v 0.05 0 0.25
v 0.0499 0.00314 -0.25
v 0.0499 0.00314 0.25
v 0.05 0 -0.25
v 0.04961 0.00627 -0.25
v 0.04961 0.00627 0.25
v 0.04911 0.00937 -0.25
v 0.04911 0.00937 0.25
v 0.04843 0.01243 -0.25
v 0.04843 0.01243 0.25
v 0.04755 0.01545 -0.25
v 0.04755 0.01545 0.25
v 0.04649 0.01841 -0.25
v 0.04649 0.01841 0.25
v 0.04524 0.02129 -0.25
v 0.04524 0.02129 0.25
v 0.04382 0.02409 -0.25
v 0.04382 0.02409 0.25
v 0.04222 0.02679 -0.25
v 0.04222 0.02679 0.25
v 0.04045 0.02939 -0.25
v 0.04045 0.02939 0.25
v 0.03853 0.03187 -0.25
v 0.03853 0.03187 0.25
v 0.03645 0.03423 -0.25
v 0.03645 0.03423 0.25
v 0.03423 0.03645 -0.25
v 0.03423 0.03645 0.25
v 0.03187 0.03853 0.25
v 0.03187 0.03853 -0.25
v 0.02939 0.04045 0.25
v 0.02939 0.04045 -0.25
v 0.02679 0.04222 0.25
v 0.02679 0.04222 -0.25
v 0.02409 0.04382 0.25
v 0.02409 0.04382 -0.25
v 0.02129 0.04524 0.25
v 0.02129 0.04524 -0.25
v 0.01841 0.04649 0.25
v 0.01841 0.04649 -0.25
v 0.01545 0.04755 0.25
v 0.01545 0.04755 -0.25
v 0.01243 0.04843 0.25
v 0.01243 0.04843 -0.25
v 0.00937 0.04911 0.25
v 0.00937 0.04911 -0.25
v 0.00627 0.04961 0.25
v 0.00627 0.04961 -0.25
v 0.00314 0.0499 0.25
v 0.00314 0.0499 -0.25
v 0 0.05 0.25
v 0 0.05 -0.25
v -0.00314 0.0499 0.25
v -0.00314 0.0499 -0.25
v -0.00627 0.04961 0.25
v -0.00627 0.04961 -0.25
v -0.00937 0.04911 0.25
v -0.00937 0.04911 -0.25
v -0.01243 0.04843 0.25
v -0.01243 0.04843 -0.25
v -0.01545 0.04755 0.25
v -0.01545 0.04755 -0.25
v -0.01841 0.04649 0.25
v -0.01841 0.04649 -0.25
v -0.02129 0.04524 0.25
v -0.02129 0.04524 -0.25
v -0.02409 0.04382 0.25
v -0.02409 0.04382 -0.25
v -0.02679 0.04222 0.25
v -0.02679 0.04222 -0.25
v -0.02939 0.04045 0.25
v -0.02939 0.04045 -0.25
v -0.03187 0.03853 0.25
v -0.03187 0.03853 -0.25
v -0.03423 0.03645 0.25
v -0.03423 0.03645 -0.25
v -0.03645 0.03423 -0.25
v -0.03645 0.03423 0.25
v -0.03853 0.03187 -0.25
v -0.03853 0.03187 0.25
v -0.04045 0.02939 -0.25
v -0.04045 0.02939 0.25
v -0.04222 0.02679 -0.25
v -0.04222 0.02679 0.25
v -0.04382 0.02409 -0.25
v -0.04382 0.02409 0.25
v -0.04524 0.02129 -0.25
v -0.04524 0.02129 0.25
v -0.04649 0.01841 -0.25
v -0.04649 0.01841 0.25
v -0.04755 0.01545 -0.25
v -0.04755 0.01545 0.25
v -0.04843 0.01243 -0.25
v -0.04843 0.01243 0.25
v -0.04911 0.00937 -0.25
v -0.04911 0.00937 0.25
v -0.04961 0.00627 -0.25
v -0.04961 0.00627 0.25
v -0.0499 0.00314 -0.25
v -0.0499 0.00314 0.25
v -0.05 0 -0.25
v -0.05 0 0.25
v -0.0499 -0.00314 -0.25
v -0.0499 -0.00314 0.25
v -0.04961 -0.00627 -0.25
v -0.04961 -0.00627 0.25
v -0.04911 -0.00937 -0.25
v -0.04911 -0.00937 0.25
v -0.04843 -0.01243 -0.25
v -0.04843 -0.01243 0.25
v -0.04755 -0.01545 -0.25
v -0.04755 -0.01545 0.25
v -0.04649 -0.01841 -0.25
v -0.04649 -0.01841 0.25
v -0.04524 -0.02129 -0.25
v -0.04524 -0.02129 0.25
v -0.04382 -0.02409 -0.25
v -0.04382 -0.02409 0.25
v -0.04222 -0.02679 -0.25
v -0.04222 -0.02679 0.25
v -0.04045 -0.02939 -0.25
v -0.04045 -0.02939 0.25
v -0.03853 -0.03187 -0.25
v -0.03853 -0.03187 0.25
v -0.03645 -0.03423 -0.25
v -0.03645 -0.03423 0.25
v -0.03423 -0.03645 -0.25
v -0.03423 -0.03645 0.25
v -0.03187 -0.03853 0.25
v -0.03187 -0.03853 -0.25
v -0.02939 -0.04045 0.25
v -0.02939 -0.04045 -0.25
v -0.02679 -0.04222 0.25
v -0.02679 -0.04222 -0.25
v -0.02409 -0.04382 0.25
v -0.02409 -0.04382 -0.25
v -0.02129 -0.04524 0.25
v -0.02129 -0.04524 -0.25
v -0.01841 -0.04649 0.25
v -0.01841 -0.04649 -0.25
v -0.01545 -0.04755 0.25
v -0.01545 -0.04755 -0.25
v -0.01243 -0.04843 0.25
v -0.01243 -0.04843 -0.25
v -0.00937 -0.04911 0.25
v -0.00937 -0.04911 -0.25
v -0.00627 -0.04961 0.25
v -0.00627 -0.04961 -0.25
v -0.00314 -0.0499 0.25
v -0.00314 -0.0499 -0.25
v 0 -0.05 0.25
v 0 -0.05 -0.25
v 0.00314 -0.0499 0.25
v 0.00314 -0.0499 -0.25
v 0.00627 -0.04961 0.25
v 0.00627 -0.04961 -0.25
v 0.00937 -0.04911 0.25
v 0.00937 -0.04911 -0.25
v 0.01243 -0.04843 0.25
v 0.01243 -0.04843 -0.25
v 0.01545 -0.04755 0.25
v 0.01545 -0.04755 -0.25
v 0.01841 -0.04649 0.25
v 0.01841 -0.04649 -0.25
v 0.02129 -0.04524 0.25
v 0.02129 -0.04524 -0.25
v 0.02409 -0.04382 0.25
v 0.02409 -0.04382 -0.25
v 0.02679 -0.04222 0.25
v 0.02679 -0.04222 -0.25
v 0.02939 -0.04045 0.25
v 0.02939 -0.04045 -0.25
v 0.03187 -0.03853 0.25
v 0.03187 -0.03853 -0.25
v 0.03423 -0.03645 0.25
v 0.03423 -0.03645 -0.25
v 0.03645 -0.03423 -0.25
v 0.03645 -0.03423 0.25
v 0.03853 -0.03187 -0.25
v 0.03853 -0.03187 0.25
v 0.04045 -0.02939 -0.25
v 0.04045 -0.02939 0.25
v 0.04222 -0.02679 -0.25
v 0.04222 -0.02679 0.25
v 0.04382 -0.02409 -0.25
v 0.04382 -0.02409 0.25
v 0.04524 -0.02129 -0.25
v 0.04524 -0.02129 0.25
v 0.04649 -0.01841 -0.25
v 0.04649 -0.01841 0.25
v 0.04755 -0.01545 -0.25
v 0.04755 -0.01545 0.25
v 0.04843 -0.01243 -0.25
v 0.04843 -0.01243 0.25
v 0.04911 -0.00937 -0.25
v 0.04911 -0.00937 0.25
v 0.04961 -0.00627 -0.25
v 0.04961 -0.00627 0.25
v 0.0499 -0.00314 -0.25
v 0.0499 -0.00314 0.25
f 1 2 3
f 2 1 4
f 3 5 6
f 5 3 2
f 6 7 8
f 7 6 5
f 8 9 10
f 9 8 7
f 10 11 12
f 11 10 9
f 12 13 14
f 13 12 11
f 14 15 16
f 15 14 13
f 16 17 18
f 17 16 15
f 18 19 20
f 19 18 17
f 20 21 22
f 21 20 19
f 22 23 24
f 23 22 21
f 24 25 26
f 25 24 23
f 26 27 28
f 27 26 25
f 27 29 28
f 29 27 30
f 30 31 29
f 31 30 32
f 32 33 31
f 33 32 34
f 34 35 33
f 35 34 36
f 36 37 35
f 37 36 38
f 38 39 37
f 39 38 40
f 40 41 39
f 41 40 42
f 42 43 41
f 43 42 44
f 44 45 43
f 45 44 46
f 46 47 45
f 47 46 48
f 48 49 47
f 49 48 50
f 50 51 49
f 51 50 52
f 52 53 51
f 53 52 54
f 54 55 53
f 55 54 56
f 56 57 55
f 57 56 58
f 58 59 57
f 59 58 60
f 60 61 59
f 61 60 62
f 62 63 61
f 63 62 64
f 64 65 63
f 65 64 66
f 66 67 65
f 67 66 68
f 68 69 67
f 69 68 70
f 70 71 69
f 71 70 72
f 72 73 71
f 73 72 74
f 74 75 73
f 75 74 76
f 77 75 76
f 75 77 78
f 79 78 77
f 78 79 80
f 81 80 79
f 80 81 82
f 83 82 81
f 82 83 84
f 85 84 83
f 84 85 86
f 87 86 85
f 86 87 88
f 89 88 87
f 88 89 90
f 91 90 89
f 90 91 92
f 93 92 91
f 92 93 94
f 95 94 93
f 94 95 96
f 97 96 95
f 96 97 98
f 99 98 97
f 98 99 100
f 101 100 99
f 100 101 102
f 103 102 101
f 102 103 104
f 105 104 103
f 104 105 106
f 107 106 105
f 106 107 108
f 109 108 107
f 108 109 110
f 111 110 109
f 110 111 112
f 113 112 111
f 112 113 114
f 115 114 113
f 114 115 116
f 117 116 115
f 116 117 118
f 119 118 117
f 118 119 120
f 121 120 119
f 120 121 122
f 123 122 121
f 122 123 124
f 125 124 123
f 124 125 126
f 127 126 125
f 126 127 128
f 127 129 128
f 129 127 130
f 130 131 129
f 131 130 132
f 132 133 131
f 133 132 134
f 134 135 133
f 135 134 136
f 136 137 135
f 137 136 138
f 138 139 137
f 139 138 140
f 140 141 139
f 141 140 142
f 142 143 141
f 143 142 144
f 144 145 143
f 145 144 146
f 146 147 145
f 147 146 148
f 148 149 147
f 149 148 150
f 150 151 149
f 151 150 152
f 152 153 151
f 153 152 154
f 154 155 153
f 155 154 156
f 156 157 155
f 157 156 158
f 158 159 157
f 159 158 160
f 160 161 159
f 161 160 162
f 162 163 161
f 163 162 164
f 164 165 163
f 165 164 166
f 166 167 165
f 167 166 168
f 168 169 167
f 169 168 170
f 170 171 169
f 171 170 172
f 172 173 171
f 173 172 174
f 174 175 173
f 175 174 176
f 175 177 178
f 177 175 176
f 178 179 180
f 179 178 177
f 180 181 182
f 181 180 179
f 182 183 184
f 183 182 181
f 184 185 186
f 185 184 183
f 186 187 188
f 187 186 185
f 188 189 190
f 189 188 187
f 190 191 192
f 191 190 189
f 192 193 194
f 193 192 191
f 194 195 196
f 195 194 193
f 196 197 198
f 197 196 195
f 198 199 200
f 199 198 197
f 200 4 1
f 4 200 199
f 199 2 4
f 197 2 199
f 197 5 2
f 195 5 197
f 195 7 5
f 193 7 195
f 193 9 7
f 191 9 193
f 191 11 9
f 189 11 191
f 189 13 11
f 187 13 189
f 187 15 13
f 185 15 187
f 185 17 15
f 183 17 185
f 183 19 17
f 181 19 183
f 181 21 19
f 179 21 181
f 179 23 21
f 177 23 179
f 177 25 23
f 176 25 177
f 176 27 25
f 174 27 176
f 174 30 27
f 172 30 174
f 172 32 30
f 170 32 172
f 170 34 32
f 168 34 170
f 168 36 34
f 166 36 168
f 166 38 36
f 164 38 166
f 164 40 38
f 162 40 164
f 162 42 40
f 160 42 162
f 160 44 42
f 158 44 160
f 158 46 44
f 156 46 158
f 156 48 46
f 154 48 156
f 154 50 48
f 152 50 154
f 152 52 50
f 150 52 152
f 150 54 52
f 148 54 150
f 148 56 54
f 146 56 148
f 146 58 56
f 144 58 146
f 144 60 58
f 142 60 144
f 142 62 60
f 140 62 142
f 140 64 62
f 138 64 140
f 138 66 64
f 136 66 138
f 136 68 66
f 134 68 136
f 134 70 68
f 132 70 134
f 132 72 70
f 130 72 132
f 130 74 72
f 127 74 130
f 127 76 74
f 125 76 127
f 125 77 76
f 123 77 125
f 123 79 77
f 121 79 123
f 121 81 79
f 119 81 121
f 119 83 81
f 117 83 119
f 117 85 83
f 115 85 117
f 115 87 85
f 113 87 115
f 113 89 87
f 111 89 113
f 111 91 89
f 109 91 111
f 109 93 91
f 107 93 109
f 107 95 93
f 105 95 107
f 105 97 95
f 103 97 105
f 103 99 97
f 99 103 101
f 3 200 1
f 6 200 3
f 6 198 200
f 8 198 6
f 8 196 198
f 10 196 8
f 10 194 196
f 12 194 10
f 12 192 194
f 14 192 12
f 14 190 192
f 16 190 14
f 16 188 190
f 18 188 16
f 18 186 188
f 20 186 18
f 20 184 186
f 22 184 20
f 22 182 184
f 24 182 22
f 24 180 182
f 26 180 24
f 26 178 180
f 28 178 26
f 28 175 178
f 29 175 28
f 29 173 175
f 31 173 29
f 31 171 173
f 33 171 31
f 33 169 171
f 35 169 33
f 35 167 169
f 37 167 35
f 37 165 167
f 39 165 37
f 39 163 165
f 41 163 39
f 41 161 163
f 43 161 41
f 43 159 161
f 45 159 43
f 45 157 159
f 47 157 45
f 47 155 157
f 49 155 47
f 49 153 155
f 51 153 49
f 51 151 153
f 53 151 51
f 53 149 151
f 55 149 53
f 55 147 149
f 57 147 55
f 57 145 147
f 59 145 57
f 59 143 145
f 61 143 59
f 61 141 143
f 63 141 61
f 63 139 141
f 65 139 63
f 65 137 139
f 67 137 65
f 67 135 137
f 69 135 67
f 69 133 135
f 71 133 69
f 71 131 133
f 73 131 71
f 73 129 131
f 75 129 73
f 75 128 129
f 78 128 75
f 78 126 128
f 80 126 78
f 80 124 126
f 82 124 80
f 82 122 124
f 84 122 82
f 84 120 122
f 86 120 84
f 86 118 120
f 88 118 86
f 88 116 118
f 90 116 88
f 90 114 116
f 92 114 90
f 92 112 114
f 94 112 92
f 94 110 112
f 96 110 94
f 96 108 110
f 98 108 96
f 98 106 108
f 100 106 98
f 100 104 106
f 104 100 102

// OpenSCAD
/*
translate([0, 0, 0.20]) {
cube([0.25, 0.25, 0.40], true);
}
translate([0, 0, 0.40]) {
cylinder($fn=100, 0.20, 0.125, 0.125);
}
*/
/*
difference() {
translate([0, 0.15, 0.00]) {
cube([0.20, 0.30, 0.20], true);
}
translate([0, 0, -0.1]) {
cylinder($fn=100, 0.20, 0.125, 0.125);
}
}
translate([0, 0.30, -0.1]) {
cylinder($fn=100, 0.20, 0.125, 0.125);
}
*/

/*

difference () {
translate([0, 0.15, 0.00]) {
cube([0.15, 0.30, 0.15], true);
}
translate([0, 0, -0.1]) {
cylinder($fn=100, 0.20, 0.125, 0.125);
}
translate([0, 0.30, -0.1]) {
cylinder($fn=100, 0.20, 0.1, 0.1);
}
}

difference () {
translate([0, 0.30, -0.1]) {
cylinder($fn=100, 0.20, 0.1, 0.1);
}

translate([0, 0.30, -0.1]) {
cylinder($fn=100, 0.20, 0.05, 0.05);
}
}
*/

translate([0, 0, -0.25]) {
cylinder($fn=100, 0.5, 0.05, 0.05);
}
